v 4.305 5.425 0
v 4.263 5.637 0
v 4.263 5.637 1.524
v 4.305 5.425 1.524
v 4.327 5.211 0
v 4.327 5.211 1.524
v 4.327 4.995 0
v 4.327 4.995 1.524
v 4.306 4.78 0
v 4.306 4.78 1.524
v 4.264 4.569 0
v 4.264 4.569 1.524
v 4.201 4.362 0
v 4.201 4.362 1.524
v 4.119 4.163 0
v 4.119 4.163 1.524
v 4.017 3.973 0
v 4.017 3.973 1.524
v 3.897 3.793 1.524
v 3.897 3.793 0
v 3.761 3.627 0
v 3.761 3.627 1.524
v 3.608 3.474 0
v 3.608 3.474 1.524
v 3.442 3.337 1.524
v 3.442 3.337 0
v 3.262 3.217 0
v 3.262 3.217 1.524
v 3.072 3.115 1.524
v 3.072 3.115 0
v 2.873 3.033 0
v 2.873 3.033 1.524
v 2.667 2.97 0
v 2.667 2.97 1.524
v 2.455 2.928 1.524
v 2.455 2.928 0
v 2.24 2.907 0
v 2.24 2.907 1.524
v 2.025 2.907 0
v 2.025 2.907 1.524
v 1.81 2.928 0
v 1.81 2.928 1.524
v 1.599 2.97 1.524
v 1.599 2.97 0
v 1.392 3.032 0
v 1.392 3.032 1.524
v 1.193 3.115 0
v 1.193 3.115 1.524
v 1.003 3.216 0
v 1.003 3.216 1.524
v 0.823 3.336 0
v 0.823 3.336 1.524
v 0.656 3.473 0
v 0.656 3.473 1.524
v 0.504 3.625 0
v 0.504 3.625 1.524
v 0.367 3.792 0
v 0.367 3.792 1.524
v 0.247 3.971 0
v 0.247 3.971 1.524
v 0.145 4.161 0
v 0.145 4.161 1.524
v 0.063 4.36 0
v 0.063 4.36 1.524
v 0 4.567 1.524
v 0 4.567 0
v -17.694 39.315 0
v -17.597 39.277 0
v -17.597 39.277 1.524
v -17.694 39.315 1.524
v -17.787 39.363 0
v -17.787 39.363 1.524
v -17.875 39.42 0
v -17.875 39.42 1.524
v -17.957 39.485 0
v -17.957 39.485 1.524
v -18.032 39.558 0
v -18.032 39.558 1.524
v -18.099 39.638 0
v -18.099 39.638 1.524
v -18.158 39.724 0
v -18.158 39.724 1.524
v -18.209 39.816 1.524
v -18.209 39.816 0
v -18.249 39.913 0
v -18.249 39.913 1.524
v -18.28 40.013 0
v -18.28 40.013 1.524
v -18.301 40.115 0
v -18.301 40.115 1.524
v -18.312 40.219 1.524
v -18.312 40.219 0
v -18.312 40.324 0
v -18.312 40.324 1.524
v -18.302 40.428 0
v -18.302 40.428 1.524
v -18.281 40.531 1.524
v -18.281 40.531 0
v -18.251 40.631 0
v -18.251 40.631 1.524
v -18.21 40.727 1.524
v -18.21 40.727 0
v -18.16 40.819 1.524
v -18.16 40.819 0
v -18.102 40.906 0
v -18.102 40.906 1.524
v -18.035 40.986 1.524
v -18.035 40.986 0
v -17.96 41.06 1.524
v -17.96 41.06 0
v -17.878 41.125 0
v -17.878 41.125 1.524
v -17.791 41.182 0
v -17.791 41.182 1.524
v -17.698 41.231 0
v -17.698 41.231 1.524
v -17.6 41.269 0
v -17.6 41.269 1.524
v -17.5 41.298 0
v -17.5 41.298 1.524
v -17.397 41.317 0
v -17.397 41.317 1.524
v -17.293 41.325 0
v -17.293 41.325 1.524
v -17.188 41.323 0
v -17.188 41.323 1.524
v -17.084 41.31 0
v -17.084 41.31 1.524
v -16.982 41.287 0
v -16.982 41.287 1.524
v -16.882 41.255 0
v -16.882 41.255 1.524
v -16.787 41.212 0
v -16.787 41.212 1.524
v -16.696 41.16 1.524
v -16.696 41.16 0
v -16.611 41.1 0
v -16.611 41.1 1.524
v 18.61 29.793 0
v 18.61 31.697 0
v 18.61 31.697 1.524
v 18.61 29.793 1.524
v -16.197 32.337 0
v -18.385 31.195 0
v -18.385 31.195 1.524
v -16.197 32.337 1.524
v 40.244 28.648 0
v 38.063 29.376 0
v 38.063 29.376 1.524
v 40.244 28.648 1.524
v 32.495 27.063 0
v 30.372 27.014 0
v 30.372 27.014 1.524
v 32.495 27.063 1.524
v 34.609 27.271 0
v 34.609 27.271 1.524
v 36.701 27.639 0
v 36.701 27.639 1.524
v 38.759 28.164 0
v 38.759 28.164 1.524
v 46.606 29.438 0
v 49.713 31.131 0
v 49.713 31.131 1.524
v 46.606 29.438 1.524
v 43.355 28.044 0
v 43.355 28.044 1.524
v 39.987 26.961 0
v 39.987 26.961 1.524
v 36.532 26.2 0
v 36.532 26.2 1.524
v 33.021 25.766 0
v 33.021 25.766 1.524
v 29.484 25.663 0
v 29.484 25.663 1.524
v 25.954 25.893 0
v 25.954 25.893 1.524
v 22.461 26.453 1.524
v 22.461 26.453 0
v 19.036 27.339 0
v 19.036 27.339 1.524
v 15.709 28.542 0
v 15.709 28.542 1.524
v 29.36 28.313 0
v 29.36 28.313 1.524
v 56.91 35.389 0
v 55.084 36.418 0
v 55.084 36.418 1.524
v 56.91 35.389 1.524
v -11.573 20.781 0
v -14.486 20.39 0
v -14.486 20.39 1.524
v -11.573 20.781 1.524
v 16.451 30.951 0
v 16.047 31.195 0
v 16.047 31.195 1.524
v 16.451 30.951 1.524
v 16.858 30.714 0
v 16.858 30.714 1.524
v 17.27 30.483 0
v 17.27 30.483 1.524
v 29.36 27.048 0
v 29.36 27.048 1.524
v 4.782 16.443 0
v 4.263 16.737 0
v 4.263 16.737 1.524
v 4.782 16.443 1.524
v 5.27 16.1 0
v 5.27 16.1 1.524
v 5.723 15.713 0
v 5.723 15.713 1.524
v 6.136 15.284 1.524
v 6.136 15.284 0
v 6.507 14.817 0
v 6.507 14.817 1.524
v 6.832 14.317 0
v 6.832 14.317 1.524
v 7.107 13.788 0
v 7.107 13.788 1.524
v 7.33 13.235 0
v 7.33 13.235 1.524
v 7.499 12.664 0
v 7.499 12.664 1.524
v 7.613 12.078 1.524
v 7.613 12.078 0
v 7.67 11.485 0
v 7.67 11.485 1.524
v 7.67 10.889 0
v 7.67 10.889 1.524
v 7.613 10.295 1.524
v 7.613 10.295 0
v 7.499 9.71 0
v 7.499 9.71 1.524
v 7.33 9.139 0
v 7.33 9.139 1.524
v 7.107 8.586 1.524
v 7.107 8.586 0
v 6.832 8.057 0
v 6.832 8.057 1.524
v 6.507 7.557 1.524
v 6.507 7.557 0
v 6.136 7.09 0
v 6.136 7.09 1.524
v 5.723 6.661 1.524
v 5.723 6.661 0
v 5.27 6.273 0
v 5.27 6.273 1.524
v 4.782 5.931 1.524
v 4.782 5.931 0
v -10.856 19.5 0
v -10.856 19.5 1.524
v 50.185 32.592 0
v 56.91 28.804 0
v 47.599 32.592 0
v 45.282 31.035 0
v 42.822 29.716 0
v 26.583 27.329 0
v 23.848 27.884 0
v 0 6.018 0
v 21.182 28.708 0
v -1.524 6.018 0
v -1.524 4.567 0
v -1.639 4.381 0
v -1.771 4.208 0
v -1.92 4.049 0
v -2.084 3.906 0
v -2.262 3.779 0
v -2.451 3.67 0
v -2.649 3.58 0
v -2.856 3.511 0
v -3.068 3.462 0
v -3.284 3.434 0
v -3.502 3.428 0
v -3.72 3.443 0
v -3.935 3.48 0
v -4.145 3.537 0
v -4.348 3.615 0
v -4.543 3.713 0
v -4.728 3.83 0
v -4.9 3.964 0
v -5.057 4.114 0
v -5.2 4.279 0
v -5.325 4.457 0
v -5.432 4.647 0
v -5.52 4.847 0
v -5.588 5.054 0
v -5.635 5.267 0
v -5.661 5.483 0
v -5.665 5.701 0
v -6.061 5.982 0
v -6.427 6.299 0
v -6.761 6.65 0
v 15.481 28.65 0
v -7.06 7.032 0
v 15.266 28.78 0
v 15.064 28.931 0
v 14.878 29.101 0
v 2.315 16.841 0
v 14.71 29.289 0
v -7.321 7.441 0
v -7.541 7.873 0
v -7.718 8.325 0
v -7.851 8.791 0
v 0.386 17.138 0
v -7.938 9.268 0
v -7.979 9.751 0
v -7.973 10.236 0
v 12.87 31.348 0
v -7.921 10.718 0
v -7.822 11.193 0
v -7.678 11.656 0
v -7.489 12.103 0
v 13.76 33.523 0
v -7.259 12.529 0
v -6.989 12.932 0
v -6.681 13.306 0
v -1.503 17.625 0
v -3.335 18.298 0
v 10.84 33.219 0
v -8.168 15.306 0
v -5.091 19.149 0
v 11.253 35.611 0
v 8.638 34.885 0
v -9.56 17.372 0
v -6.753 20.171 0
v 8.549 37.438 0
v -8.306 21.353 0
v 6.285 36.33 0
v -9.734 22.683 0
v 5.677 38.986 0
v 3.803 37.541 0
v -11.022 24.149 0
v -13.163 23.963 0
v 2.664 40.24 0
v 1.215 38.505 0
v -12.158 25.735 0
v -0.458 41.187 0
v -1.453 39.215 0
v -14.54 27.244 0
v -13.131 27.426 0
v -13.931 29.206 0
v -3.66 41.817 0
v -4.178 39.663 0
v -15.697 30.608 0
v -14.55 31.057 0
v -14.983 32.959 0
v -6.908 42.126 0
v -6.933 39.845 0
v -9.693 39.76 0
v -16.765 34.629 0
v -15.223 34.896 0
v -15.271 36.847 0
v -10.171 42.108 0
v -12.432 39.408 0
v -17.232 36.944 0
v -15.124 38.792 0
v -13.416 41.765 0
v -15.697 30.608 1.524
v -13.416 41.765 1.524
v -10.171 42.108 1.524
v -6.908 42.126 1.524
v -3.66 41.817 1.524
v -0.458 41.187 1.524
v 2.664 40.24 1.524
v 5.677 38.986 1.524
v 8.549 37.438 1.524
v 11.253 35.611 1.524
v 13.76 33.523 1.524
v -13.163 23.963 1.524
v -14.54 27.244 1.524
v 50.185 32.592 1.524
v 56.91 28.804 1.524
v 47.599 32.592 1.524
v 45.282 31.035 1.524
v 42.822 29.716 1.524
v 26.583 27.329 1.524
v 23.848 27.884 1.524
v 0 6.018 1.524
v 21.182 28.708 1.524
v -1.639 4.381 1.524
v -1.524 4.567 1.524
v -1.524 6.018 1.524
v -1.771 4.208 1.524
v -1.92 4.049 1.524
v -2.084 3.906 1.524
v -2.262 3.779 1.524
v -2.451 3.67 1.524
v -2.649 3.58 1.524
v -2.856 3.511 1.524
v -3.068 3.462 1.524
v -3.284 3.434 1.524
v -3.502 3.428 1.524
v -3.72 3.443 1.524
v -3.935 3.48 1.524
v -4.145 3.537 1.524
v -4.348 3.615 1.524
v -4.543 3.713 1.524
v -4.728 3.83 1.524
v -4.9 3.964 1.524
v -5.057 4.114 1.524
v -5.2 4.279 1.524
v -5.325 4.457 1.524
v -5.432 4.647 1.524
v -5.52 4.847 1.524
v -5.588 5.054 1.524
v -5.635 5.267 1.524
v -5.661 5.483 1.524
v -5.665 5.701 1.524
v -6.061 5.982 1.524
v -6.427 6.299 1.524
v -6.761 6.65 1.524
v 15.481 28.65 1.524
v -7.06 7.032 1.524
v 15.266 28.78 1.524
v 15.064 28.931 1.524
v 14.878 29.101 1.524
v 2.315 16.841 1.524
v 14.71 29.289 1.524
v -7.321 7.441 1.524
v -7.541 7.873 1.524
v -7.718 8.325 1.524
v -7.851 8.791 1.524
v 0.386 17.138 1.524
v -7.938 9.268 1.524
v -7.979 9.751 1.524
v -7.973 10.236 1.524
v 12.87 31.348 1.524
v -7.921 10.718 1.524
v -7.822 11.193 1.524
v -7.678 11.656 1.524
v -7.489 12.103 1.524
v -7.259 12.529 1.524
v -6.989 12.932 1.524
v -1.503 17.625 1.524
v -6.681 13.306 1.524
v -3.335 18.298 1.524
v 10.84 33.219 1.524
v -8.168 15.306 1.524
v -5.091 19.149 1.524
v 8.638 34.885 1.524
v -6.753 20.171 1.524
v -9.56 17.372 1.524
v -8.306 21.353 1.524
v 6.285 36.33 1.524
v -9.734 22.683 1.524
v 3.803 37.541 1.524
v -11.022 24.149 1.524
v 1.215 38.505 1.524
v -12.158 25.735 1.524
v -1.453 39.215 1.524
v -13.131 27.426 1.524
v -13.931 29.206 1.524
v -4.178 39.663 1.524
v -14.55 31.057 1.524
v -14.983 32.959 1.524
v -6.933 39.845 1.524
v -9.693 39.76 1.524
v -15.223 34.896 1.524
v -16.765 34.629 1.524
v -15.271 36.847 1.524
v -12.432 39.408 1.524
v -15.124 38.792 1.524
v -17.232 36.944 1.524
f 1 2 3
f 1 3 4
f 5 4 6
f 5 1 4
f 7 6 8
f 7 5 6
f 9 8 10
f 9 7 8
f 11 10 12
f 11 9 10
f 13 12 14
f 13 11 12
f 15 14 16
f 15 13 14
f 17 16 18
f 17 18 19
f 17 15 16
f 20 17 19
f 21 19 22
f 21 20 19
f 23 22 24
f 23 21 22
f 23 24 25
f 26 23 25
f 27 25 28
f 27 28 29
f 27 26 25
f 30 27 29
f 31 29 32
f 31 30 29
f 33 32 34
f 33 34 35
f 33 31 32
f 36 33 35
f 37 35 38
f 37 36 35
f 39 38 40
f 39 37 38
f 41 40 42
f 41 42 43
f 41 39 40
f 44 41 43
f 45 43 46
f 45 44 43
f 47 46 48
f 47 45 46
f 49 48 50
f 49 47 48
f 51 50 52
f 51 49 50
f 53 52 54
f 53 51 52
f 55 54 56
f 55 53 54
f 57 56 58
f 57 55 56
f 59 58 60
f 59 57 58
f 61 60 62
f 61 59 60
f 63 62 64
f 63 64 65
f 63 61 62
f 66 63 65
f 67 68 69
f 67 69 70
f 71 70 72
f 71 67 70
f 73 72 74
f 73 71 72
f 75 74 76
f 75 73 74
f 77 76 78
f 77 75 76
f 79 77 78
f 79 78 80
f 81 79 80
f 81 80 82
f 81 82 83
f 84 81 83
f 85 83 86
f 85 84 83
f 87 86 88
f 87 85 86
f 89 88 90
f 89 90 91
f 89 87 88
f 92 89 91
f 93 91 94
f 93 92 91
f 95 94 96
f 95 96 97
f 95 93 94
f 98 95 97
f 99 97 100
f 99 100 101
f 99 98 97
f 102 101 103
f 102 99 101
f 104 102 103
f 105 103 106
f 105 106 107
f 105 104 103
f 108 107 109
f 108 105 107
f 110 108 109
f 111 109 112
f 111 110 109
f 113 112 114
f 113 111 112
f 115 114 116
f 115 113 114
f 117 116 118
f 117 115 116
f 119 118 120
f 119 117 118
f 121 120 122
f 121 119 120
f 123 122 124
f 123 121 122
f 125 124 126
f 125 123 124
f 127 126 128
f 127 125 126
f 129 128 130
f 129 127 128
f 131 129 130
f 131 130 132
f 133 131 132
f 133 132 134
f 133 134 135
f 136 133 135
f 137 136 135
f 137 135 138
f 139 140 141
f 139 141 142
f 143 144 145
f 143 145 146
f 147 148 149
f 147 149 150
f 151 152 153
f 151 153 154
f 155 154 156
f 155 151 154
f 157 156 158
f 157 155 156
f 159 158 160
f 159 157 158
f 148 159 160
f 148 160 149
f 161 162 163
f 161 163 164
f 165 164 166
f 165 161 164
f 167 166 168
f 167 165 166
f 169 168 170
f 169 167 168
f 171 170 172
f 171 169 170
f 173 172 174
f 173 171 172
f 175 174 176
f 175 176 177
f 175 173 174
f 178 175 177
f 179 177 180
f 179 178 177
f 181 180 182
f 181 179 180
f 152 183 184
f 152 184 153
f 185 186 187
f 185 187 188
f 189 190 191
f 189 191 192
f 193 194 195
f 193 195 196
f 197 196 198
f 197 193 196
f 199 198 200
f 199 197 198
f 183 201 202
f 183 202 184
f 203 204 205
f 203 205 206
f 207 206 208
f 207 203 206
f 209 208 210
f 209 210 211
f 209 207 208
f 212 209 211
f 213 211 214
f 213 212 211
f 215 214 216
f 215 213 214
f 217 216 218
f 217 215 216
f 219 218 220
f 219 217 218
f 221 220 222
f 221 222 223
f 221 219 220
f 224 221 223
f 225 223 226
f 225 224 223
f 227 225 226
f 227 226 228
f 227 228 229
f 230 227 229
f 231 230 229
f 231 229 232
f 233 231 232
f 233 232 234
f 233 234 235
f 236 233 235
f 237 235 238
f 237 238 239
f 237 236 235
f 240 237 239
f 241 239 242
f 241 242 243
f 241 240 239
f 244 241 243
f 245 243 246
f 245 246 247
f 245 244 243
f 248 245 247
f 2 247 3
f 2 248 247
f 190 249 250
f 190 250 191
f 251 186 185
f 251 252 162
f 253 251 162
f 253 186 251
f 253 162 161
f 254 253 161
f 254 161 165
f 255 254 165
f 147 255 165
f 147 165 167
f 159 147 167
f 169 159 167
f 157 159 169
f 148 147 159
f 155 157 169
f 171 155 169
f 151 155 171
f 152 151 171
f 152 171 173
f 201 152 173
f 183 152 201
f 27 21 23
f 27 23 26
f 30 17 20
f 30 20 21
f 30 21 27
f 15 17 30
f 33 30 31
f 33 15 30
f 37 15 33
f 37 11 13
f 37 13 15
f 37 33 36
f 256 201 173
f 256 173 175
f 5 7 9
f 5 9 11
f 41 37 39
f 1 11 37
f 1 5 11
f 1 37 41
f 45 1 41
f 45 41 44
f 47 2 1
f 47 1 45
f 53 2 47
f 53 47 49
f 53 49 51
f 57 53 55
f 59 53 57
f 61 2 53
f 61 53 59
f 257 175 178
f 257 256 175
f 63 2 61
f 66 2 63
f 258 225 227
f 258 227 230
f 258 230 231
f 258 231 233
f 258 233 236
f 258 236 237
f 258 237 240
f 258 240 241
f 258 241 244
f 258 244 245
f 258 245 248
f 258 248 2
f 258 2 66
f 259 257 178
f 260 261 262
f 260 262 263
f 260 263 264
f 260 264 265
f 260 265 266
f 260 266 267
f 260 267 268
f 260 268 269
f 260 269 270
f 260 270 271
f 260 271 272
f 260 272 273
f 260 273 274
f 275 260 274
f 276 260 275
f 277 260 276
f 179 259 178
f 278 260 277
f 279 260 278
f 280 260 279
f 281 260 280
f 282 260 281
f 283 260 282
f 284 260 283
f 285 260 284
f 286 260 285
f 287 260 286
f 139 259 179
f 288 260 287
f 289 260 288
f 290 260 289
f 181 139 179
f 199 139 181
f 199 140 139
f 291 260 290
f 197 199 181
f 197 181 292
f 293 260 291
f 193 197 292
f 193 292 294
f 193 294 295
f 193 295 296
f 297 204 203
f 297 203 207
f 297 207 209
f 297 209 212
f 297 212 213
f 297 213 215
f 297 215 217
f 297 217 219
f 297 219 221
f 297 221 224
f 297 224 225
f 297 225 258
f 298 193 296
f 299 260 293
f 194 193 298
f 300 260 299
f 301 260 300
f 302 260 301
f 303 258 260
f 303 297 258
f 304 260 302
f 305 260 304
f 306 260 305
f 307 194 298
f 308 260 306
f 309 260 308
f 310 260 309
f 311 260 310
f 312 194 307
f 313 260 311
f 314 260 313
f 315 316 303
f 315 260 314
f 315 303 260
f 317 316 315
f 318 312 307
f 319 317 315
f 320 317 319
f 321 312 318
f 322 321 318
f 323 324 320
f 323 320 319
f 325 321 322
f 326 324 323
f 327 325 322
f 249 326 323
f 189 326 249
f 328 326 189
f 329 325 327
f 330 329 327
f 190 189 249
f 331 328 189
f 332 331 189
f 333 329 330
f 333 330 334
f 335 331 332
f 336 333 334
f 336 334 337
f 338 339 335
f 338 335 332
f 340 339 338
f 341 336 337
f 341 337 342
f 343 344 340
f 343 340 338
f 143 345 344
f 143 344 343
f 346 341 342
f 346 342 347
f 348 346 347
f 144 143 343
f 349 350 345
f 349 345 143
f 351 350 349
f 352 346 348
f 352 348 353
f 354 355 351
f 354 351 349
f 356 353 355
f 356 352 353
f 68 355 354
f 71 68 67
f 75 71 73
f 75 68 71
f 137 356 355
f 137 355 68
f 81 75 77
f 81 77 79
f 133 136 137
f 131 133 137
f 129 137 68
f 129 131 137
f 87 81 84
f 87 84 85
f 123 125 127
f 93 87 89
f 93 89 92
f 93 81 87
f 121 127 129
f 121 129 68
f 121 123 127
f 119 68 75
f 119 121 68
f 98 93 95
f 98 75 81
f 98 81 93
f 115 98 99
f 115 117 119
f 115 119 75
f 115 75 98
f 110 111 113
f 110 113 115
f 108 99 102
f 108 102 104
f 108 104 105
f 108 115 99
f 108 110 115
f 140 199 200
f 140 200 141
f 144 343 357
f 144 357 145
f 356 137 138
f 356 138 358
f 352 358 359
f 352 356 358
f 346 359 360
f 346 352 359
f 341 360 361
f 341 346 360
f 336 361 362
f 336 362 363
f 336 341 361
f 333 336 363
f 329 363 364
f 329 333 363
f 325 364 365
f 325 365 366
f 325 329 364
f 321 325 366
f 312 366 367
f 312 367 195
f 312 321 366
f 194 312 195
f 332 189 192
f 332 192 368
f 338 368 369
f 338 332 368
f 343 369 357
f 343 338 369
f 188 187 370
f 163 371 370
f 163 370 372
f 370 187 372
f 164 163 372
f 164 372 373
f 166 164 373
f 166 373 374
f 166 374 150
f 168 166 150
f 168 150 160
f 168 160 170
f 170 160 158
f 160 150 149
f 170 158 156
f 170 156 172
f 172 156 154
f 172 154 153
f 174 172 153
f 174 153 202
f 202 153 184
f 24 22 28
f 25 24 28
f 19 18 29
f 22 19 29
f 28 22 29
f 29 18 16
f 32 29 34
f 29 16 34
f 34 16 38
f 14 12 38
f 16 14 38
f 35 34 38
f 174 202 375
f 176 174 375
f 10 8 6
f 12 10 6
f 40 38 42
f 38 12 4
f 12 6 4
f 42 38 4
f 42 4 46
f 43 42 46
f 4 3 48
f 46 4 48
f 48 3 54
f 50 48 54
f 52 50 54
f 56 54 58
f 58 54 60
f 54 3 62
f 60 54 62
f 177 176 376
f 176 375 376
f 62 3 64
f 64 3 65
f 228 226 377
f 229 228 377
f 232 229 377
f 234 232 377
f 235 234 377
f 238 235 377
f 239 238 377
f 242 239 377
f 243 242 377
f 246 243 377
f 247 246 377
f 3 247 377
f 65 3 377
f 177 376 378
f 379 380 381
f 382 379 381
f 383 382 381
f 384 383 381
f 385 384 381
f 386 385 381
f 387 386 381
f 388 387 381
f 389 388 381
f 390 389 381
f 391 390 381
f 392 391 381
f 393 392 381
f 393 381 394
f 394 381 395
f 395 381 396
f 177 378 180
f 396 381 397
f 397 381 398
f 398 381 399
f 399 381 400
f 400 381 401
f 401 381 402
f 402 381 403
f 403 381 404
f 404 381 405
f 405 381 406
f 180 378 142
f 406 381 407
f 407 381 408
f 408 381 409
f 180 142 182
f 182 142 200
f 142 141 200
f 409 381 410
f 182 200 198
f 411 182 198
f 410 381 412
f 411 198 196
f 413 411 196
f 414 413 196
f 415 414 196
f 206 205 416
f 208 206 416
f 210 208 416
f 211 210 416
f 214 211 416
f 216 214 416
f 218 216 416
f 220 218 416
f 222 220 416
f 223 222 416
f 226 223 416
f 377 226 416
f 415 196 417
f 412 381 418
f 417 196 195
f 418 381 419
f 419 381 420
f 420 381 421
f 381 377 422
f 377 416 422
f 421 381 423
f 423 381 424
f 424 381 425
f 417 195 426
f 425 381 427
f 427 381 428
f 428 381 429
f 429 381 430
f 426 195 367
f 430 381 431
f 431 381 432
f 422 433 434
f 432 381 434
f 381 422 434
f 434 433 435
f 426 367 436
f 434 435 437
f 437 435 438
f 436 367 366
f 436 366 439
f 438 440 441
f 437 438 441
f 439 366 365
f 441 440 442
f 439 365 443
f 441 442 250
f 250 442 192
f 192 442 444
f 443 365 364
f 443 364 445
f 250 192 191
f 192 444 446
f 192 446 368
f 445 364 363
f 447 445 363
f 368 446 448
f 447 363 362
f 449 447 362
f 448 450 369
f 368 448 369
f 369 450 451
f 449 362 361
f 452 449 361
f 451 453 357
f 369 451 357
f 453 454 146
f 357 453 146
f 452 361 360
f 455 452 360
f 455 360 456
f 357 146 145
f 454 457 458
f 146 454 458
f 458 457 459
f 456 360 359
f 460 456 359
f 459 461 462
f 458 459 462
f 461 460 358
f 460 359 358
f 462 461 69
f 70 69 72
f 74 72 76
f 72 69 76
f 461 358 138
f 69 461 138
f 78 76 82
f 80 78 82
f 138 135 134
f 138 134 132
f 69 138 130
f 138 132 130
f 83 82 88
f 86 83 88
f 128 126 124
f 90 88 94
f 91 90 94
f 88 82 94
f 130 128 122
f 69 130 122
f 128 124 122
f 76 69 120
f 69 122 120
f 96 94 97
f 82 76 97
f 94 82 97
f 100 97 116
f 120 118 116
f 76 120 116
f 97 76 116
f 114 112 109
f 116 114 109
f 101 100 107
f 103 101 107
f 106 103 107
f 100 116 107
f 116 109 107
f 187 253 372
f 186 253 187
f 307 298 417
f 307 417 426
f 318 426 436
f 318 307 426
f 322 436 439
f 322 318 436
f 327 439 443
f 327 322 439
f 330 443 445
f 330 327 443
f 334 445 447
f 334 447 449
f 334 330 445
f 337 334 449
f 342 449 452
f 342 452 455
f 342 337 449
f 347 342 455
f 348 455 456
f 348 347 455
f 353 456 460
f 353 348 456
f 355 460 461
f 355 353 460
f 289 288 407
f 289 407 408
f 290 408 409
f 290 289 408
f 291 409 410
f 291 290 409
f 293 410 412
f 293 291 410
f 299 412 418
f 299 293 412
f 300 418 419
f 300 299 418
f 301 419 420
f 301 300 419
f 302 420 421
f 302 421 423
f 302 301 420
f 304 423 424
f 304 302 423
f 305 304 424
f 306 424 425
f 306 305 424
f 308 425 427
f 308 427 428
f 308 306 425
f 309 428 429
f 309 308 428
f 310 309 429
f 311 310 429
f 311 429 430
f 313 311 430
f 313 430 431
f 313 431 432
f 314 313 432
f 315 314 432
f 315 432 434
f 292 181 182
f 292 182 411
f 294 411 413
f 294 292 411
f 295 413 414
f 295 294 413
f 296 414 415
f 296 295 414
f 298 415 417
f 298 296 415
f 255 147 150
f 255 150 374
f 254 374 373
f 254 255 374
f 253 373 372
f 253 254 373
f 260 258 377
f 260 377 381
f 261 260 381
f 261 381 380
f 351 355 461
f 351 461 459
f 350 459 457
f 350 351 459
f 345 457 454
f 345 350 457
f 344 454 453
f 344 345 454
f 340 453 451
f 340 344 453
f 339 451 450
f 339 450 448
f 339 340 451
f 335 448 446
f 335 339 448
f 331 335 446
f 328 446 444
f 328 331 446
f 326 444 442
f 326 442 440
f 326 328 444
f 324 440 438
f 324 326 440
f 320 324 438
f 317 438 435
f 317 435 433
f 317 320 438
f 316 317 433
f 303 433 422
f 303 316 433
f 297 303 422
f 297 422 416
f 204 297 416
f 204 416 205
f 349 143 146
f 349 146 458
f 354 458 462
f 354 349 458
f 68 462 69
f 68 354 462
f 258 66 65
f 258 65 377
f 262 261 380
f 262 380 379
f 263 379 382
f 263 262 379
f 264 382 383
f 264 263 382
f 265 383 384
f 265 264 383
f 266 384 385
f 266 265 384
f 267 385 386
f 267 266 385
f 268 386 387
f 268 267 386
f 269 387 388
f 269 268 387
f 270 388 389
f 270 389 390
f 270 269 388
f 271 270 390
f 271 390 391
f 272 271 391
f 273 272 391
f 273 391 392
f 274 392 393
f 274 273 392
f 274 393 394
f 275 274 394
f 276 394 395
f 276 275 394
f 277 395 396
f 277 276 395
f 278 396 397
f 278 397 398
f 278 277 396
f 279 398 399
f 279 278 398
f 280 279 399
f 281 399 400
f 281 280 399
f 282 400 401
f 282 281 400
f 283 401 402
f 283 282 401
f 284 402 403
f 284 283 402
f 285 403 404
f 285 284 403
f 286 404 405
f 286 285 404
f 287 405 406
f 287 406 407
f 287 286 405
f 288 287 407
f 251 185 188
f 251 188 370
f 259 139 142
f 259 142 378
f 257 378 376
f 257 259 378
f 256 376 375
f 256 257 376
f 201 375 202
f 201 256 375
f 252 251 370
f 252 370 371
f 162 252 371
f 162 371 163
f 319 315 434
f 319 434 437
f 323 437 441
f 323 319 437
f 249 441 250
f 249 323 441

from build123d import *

# Parameters (mm, degrees)
BOSS_EXTRUDE1_DEPTH = 1.524


with BuildPart() as part:
    # Sketch1 → Boss-Extrude1 (new body)
    with BuildSketch(Plane.XY):
        with BuildLine():
            ThreePointArc((-16.197076151, 32.337475868), (-17.011067411, 35.784074673), (-17.596756232, 39.276723195))
            ThreePointArc((-17.596756232, 39.276723195), (-18.186455817, 40.773995588), (-16.610546214, 41.09969352))
            ThreePointArc((-16.610546214, 41.09969352), (1.114796248, 40.752315398), (16.047100727, 31.195395396))
            ThreePointArc((16.047100727, 31.195395396), (16.65383311, 30.831484379), (17.269539256, 30.482971317))
            Line((17.269539256, 30.482971317), (18.609894912, 31.696837019))
            Line((18.609894912, 31.696837019), (18.609894912, 29.792589361))
            ThreePointArc((18.609894912, 29.792589361), (23.848153012, 27.88417162), (29.360160247, 27.048000318))
            Line((29.360160247, 27.048000318), (29.360160247, 28.312908217))
            Line((29.360160247, 28.312908217), (30.371964085, 27.014480945))
            ThreePointArc((30.371964085, 27.014480945), (34.609173407, 27.271356348), (38.759272861, 28.163882163))
            Line((38.759272861, 28.163882163), (38.063395752, 29.375894853))
            Line((38.063395752, 29.375894853), (40.24389972, 28.648108402))
            ThreePointArc((40.24389972, 28.648108402), (44.068672668, 30.34536008), (47.598834428, 32.592026348))
            Line((47.598834428, 32.592026348), (55.083699621, 36.417717956))
            Line((55.083699621, 36.417717956), (56.910260303, 35.388944708))
            Line((56.910260303, 35.388944708), (50.185076604, 32.592026348))
            Line((50.185076604, 32.592026348), (56.910260303, 28.804203066))
            Line((56.910260303, 28.804203066), (49.712738856, 31.130827352))
            ThreePointArc((49.712738856, 31.130827352), (33.020763696, 25.765572392), (15.708965282, 28.542194647))
            ThreePointArc((15.708965282, 28.542194647), (15.163131597, 28.853301218), (14.710356917, 29.288866136))
            ThreePointArc((14.710356917, 29.288866136), (1.215411603, 38.505400506), (-15.123980563, 38.792312441))
            ThreePointArc((-15.123980563, 38.792312441), (-10.396030461, 23.399793439), (4.263099046, 16.736980561))
            ThreePointArc((4.263099046, 16.736980561), (7.676752936, 11.186831392), (4.263099046, 5.636682223))
            ThreePointArc((4.263099046, 5.636682223), (2.666546478, 2.970135745), (0, 4.566688313))
            Line((0, 4.566688313), (0, 6.017862143))
            Line((0, 6.017862143), (-1.524, 6.017862143))
            Line((-1.524, 6.017862143), (-1.524, 4.566688313))
            ThreePointArc((-1.524, 4.566688313), (-4.040524665, 3.505966865), (-5.665097739, 5.701140823))
            ThreePointArc((-5.665097739, 5.701140823), (-7.938147597, 9.268051635), (-6.680633826, 13.306401238))
            ThreePointArc((-6.680633826, 13.306401238), (-8.875864768, 16.330833019), (-10.856041848, 19.50023757))
            Line((-10.856041848, 19.50023757), (-14.485790124, 20.389849107))
            Line((-14.485790124, 20.389849107), (-11.572605425, 20.780961266))
            ThreePointArc((-11.572605425, 20.780961266), (-13.878489207, 25.592275915), (-15.696943684, 30.608157889))
            Line((-15.696943684, 30.608157889), (-18.384655546, 31.195395396))
            Line((-18.384655546, 31.195395396), (-16.197076151, 32.337475868))
        make_face()
    extrude(amount=BOSS_EXTRUDE1_DEPTH)


solid = part.part
